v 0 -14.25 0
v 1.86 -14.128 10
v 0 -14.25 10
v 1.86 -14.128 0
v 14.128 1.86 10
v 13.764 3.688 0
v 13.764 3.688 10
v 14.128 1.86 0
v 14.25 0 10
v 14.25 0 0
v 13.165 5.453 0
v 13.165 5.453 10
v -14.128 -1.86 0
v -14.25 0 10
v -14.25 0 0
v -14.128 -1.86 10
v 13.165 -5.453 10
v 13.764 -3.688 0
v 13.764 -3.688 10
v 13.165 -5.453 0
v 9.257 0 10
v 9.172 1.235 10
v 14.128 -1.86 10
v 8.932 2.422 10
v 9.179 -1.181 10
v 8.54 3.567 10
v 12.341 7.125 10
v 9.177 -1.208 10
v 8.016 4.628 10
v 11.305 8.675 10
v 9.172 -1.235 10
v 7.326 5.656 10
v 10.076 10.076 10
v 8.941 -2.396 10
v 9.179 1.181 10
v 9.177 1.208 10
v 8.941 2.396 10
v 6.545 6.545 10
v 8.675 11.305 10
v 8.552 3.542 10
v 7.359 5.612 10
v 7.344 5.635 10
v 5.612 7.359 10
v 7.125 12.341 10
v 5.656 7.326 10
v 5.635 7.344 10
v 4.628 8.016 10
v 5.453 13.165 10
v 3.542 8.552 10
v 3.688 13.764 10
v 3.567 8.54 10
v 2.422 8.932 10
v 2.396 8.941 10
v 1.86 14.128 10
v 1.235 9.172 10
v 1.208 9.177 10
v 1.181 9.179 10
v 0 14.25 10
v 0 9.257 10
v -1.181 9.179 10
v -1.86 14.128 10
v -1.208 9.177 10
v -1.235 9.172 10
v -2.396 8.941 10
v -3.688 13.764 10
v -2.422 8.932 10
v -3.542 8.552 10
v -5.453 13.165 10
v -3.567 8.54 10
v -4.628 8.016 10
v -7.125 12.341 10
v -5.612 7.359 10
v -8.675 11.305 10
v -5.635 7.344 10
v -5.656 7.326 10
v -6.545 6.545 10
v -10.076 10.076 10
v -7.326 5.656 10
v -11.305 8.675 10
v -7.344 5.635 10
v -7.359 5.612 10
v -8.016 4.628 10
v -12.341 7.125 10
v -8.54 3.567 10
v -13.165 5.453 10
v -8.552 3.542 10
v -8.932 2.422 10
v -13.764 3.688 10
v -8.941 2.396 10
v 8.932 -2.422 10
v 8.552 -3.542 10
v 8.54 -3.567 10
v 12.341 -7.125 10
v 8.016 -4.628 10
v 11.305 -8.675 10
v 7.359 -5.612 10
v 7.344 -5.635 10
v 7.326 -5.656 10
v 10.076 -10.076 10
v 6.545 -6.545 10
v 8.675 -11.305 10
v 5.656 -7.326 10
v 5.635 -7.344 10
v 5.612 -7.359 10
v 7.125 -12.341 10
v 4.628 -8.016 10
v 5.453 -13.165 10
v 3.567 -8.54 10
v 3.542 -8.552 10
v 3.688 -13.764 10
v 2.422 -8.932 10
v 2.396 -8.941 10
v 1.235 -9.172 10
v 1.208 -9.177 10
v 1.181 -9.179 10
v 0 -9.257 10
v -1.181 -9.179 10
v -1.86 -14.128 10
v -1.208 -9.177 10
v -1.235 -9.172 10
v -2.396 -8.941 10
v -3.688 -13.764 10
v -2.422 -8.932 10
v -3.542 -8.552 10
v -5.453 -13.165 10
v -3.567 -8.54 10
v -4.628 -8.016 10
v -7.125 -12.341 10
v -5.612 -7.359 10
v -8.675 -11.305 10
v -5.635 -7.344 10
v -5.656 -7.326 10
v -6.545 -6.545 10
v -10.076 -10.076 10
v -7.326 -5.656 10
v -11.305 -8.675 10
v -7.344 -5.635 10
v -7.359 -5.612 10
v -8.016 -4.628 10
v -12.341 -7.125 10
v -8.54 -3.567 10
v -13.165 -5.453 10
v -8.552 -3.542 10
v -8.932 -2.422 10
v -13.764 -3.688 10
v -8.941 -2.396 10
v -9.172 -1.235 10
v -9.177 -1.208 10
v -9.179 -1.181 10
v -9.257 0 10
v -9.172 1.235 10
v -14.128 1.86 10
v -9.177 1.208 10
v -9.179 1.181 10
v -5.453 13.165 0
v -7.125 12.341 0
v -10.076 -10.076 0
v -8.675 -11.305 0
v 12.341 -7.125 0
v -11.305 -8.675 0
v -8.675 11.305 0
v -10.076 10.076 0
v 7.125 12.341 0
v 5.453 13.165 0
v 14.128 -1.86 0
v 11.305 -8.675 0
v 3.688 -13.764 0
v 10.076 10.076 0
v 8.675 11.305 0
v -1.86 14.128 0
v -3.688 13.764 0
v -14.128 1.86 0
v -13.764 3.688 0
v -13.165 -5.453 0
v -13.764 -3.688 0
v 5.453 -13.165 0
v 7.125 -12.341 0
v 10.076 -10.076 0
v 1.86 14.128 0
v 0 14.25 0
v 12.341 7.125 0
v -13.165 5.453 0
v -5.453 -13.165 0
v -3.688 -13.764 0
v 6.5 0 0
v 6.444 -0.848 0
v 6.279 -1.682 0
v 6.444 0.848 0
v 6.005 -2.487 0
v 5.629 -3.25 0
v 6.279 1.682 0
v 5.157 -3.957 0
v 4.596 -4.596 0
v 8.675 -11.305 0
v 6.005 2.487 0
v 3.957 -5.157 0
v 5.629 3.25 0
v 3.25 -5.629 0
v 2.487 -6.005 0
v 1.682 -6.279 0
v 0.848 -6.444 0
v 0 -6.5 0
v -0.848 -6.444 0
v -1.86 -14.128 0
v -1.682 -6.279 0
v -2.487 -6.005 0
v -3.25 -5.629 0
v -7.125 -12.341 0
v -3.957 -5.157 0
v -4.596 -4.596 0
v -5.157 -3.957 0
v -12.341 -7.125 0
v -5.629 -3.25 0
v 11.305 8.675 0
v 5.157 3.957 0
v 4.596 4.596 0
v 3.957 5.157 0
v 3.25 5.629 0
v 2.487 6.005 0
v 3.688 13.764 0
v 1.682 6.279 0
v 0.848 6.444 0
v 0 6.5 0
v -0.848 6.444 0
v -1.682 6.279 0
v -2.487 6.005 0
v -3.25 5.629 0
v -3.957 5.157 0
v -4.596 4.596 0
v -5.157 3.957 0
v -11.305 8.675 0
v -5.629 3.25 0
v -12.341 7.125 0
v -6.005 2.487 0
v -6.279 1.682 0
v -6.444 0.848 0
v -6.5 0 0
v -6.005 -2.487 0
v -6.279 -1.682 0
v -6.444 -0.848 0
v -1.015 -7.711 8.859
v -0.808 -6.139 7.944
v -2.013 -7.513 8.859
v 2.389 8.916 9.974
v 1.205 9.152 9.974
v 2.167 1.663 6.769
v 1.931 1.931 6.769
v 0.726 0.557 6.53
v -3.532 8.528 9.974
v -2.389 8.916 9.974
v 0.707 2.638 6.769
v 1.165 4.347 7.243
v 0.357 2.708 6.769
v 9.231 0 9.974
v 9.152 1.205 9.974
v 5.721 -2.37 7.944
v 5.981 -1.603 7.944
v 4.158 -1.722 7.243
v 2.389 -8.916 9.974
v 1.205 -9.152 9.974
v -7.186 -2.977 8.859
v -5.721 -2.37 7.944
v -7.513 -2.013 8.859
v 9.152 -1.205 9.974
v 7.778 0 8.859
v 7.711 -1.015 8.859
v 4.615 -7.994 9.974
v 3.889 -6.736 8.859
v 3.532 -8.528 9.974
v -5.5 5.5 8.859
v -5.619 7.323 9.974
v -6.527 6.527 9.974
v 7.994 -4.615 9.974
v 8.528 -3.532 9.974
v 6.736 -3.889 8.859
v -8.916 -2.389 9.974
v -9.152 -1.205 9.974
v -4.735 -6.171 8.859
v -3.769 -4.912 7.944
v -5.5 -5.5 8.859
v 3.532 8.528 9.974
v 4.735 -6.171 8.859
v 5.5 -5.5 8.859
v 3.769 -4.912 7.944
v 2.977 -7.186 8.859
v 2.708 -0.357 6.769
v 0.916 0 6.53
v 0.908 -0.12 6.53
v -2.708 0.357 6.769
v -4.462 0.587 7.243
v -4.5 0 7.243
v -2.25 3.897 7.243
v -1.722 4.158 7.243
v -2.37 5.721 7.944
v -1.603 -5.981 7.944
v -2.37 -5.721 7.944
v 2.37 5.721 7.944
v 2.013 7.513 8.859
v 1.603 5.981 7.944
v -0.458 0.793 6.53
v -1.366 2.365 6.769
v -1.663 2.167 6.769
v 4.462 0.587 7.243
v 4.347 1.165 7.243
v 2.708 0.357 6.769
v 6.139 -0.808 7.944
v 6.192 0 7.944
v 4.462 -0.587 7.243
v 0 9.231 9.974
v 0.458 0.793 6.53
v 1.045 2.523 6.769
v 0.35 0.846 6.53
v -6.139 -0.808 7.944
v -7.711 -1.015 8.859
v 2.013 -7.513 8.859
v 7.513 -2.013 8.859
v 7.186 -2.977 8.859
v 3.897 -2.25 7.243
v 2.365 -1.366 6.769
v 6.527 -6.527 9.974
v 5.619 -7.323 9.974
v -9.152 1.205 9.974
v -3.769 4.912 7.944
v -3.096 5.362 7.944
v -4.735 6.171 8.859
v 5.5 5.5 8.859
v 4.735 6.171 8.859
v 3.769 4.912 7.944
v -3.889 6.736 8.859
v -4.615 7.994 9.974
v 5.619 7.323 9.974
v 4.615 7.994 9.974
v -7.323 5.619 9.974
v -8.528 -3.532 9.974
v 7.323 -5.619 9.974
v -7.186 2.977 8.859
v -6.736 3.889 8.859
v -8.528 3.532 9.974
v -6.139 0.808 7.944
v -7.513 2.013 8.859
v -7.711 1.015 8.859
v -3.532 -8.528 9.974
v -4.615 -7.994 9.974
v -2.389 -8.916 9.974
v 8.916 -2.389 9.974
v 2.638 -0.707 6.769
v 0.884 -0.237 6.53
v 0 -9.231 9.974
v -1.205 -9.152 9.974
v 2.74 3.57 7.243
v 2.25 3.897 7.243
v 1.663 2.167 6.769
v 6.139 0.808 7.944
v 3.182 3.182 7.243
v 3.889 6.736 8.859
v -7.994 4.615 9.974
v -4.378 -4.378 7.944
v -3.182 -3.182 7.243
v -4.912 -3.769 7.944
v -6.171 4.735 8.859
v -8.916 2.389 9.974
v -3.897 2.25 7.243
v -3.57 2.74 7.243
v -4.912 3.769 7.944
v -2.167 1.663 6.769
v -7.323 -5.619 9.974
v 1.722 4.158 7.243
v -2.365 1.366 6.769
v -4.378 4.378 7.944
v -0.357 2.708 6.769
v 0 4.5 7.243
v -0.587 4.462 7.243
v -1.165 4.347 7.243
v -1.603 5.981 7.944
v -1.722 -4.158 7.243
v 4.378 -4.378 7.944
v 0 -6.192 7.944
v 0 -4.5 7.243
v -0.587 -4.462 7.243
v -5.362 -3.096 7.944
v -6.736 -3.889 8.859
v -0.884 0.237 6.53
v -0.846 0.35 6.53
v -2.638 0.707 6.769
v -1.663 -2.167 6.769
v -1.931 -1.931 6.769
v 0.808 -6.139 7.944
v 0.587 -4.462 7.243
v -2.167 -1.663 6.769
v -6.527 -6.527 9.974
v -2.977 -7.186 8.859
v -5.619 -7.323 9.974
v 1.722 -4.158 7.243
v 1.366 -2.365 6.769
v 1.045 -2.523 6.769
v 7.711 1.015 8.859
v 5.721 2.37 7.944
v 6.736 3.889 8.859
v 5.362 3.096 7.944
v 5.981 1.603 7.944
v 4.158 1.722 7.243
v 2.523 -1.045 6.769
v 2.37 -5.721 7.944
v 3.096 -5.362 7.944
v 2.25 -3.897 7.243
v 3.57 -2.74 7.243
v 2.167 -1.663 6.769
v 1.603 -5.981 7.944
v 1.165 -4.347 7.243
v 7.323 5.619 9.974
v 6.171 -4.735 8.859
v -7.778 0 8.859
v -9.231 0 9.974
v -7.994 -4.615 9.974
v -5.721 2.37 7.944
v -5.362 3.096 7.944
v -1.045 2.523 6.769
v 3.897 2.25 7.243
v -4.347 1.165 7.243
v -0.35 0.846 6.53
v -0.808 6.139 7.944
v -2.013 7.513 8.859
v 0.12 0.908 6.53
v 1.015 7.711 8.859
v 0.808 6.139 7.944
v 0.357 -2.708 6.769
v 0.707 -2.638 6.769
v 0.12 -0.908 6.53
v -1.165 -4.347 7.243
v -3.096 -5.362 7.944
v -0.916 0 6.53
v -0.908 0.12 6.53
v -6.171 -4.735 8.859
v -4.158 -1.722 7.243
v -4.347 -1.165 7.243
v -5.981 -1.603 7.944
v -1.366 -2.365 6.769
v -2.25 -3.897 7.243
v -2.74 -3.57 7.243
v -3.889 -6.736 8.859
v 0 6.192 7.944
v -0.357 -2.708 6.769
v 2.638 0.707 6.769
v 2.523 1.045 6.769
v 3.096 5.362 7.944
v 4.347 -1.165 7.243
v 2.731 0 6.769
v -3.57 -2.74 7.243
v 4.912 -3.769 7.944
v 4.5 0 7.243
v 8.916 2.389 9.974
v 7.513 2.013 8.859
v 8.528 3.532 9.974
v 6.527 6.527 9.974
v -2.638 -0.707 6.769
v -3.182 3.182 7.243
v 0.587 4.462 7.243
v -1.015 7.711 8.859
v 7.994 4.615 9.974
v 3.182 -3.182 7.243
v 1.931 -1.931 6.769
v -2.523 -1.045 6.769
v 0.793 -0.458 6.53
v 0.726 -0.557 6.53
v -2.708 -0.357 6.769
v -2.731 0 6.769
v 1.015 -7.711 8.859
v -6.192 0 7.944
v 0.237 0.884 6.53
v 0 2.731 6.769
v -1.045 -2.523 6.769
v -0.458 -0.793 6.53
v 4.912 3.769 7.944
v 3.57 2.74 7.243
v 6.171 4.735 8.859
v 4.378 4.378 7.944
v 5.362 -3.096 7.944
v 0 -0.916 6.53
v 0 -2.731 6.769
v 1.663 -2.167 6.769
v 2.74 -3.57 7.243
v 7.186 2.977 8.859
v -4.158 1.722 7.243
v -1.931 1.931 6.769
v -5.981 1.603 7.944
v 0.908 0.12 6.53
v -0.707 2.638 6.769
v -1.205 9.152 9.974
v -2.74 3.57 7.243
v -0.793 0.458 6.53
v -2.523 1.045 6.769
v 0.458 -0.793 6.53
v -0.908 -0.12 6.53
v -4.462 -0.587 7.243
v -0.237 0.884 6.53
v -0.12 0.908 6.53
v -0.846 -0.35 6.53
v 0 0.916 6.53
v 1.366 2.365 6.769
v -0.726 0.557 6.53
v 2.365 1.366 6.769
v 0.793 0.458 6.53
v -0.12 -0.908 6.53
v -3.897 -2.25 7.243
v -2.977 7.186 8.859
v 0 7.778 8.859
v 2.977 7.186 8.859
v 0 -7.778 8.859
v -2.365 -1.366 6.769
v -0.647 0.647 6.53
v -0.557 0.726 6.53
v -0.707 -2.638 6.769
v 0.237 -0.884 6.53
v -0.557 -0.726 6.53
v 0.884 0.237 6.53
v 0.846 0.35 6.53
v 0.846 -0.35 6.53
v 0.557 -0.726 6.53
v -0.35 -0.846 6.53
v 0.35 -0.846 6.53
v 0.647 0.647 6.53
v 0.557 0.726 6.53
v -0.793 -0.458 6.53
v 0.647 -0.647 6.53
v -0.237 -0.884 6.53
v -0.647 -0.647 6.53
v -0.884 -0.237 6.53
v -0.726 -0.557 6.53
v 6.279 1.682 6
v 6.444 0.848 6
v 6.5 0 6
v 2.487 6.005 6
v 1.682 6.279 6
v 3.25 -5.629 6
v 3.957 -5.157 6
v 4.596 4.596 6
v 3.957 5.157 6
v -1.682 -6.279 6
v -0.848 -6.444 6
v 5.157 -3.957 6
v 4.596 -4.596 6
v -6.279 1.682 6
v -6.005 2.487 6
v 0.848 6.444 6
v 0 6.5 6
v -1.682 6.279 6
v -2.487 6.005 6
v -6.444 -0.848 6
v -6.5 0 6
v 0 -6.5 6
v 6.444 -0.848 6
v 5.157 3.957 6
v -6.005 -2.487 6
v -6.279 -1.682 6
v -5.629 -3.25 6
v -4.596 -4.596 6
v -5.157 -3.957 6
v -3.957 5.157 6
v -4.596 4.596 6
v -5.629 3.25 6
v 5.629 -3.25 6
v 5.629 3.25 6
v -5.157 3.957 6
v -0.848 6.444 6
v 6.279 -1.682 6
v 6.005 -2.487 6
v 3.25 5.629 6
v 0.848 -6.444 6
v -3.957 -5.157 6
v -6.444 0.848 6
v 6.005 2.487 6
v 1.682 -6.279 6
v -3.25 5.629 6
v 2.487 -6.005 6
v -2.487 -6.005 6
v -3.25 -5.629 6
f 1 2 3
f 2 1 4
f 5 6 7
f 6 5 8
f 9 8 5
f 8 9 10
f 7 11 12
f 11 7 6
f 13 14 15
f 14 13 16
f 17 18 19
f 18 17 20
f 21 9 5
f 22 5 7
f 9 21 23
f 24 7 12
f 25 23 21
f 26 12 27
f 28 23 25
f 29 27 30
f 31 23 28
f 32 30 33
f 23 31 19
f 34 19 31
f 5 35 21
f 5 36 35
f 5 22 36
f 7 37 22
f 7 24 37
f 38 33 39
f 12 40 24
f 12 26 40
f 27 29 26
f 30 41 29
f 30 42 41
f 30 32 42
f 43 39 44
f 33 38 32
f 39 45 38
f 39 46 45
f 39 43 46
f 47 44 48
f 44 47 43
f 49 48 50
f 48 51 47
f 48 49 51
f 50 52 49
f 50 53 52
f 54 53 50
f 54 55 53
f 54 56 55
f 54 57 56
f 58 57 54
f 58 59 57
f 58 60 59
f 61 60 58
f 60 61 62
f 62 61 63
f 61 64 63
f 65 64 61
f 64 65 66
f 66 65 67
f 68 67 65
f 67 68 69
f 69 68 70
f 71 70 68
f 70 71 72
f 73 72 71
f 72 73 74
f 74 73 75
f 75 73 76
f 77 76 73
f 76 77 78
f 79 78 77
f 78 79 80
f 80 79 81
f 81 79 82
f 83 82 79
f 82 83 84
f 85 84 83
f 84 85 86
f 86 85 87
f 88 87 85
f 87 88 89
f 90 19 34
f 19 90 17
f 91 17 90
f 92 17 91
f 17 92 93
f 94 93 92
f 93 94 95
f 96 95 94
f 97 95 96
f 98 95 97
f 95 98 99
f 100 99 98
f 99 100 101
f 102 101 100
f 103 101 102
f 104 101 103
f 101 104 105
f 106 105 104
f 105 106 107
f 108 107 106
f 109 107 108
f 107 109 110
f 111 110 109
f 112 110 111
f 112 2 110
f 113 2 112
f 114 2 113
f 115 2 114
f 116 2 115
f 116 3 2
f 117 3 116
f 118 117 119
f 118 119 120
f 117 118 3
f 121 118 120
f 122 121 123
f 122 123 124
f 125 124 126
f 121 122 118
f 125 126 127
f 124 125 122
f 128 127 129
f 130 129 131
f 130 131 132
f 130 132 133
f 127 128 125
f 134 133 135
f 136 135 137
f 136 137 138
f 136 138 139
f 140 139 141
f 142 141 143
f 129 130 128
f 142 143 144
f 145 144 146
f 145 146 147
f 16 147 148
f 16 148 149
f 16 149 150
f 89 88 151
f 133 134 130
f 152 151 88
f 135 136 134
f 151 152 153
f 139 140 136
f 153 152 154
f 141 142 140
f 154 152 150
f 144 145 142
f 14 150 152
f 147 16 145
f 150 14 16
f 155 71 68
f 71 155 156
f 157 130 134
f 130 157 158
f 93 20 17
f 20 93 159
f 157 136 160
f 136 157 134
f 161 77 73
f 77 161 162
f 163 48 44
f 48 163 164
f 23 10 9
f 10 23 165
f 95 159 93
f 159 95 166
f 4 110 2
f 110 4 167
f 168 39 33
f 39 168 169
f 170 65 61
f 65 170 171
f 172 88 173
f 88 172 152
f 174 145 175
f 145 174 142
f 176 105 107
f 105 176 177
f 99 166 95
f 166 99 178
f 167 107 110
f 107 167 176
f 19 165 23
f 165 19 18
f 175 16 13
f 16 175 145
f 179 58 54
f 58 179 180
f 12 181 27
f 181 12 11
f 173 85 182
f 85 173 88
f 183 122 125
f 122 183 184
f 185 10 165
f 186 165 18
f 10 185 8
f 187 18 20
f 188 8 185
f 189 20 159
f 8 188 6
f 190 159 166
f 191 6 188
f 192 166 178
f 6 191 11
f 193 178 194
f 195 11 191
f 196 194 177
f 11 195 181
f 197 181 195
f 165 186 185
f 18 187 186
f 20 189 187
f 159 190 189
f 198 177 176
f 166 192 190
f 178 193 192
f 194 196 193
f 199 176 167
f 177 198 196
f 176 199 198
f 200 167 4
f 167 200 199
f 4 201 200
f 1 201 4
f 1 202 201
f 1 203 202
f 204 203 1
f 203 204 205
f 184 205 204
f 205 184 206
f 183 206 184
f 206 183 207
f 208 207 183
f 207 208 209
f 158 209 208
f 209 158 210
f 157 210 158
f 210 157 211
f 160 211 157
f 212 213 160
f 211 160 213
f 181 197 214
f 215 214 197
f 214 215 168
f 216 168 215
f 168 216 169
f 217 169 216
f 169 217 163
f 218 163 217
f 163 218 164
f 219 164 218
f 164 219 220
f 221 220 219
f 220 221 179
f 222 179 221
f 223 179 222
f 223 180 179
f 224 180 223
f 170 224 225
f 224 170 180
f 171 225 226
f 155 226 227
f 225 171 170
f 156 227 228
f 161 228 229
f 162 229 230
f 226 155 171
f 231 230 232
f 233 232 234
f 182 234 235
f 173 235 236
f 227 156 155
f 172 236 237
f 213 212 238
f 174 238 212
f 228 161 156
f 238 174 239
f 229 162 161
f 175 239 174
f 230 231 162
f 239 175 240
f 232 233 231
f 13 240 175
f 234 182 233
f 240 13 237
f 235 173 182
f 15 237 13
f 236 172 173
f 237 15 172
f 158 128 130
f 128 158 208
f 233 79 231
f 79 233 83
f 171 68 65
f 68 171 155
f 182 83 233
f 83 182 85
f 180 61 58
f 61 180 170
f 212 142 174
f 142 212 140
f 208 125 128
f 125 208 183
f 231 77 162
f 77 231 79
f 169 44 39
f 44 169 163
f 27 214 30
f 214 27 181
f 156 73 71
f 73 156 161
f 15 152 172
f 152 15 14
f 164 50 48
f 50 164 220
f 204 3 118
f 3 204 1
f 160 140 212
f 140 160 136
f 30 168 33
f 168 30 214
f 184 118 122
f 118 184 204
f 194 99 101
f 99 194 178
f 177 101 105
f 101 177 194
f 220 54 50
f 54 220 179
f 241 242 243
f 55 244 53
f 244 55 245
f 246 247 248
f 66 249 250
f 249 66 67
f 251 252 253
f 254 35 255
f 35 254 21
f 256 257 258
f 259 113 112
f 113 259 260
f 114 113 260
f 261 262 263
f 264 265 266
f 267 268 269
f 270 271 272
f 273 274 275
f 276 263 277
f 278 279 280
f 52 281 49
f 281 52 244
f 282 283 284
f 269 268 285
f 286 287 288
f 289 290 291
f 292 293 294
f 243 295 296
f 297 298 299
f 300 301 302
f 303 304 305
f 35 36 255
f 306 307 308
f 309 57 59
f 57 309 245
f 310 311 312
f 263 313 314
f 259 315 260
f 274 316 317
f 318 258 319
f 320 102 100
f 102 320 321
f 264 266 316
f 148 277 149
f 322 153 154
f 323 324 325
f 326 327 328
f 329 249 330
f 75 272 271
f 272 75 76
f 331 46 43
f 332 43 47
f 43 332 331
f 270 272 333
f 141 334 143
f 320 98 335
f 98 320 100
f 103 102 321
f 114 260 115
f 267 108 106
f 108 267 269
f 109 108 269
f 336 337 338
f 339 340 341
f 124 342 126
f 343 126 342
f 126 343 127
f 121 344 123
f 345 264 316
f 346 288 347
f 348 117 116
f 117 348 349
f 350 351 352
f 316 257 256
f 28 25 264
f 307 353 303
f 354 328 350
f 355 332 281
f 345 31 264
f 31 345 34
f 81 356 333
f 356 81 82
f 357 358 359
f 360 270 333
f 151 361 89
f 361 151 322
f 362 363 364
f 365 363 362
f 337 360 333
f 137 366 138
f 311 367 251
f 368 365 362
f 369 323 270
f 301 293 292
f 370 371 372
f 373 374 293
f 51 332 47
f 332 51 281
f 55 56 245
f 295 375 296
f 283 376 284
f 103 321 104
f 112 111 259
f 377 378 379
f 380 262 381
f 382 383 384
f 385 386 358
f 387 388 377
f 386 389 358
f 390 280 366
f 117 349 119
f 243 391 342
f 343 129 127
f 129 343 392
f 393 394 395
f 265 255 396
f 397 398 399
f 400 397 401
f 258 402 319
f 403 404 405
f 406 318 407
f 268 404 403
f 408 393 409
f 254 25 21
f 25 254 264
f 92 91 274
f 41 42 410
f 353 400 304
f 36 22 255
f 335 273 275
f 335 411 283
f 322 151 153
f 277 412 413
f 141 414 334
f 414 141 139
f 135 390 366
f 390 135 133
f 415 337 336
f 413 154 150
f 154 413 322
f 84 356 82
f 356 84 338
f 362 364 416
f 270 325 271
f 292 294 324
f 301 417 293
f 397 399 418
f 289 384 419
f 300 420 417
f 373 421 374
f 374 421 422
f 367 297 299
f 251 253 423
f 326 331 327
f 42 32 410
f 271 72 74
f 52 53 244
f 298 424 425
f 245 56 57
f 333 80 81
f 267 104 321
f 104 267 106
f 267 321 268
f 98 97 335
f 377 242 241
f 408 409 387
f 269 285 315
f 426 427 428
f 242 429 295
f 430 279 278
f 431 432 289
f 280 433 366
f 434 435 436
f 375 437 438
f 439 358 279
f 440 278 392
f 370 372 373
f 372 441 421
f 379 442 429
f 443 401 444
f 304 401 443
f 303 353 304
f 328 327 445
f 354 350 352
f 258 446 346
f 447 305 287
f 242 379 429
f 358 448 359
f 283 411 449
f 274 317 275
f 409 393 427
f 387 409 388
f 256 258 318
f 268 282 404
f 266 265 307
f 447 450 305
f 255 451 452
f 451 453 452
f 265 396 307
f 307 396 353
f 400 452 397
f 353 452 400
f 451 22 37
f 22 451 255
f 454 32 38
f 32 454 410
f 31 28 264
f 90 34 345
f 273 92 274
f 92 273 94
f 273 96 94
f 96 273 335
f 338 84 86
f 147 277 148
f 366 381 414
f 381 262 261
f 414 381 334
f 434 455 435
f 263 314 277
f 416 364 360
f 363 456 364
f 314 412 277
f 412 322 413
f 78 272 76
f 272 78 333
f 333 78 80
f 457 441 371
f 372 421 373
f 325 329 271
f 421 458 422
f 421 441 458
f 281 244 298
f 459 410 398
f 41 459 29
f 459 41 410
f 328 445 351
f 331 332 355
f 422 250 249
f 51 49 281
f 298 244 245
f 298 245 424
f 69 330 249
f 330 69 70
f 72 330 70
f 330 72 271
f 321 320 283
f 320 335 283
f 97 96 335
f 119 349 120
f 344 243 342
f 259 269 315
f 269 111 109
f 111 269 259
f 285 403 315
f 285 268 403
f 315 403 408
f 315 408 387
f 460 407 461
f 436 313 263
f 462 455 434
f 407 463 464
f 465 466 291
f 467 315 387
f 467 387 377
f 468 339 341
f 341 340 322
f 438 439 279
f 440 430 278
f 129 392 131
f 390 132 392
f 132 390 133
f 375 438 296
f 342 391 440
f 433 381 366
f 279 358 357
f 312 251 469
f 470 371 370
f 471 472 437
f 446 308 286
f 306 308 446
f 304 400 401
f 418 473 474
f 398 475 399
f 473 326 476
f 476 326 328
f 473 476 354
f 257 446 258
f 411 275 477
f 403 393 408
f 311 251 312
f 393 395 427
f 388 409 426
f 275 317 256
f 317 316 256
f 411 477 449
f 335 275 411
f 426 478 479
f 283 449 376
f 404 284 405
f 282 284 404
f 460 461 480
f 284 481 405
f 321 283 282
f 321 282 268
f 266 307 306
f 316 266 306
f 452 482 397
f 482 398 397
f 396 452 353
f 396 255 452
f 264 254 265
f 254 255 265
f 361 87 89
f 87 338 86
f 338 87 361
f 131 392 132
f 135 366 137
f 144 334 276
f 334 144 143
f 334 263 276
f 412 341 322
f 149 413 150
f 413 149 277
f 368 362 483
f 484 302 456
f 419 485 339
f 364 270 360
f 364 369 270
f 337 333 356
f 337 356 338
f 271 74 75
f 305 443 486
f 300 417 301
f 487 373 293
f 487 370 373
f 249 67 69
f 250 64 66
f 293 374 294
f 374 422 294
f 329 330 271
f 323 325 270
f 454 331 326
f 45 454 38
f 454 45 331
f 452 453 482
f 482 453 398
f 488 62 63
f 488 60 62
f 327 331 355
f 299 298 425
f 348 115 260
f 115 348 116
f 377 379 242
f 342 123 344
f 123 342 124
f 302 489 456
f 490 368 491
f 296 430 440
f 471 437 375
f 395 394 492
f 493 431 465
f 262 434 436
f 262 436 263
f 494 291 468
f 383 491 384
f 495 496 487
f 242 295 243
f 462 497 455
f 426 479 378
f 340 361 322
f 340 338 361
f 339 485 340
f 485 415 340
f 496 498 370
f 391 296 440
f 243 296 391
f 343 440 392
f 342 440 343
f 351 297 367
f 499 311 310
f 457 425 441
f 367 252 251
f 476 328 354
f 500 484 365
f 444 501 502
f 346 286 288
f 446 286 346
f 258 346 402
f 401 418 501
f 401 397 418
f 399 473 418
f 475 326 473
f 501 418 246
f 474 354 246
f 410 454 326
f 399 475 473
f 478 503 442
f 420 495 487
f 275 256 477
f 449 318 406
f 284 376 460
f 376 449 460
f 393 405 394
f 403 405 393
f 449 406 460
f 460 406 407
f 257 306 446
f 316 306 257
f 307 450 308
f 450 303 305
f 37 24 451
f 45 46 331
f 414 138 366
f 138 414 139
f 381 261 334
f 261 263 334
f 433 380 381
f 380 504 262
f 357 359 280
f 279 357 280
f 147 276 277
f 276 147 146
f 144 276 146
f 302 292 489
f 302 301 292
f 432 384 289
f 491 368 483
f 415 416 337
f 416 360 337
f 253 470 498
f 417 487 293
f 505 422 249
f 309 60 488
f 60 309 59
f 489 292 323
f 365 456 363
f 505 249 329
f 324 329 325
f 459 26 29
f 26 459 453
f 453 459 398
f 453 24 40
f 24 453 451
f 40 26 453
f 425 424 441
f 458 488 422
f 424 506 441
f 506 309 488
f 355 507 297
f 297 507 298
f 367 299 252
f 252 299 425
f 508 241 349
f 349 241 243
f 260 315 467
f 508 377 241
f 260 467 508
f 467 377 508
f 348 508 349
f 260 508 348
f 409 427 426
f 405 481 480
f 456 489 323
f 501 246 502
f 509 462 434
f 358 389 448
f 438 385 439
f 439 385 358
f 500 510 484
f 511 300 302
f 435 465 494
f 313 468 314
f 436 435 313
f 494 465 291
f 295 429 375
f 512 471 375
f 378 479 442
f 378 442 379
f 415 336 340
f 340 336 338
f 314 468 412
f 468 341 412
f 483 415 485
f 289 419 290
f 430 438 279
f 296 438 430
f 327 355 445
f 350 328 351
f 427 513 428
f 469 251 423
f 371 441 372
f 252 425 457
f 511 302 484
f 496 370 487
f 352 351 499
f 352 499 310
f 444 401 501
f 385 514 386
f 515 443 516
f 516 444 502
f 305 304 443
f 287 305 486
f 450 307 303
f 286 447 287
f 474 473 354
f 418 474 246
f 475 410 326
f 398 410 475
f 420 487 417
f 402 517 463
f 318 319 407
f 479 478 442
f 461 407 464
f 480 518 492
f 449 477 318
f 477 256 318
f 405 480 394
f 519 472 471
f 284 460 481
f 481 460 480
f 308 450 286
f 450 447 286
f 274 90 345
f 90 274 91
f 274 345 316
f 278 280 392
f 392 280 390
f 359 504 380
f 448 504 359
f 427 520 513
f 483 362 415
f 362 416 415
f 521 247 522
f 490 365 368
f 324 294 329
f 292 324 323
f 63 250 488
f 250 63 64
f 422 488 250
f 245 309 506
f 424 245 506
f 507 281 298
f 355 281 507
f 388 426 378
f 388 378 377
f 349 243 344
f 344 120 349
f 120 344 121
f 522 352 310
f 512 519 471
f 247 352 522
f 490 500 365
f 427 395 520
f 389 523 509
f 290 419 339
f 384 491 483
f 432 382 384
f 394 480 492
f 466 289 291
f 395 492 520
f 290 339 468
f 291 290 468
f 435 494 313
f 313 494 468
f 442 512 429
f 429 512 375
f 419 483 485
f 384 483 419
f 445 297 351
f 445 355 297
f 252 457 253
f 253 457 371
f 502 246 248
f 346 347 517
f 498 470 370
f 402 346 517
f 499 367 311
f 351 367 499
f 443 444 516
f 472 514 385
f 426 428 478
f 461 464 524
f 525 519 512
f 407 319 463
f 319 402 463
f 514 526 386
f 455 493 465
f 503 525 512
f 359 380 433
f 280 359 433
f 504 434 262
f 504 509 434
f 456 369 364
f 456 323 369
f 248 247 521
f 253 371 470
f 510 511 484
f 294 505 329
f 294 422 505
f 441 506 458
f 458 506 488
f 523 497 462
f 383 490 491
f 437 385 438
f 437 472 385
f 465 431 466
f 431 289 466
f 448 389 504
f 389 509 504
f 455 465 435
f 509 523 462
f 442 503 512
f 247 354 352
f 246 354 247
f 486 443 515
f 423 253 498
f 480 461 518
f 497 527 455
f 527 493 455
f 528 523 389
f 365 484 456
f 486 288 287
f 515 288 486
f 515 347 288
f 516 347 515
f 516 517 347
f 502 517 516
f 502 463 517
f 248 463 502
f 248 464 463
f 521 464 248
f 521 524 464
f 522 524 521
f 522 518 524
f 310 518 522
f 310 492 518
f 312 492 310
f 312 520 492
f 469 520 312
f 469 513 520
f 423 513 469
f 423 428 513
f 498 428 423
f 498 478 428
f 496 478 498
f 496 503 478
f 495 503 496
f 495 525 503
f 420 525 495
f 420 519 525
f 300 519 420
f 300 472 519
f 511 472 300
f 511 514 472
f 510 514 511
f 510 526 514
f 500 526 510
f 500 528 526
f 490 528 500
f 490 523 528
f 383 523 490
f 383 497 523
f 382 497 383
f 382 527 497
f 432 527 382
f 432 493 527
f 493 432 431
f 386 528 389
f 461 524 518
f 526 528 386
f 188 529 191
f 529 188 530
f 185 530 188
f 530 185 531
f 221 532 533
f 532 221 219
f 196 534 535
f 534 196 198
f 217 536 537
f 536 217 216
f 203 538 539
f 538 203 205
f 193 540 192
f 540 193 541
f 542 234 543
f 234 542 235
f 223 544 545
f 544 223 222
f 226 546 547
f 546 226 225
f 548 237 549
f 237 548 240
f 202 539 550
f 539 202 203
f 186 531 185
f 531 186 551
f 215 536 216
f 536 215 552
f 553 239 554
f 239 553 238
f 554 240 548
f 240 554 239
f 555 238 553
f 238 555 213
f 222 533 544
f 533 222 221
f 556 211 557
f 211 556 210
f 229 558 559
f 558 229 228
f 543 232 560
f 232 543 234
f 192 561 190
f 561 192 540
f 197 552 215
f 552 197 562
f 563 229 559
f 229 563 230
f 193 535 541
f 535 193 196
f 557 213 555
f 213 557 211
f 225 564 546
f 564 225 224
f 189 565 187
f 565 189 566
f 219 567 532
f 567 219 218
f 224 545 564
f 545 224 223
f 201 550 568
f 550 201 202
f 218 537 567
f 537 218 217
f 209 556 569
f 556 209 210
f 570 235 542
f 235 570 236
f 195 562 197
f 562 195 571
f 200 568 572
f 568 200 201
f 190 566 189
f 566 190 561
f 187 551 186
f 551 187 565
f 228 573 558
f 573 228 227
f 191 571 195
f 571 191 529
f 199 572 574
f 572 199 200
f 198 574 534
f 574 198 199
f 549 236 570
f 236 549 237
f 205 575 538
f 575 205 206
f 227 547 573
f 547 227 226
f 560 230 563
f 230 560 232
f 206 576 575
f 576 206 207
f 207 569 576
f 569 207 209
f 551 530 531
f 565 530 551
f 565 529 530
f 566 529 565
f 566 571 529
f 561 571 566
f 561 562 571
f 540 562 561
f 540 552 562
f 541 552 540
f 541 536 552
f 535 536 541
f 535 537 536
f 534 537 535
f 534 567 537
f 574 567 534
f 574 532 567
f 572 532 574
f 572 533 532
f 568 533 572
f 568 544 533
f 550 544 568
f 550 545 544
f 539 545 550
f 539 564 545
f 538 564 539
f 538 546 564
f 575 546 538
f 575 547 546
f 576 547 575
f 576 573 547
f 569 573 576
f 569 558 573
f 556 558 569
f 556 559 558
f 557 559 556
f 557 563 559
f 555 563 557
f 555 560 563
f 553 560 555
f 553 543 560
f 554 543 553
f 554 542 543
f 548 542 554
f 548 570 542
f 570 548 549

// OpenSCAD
// file: measurements.scad
// Measurements of YOUR table, shared by every printed part, in millimetres.
//
// These are placeholders until the real table is measured with calipers. Edit
// the numbers here (nothing else in this file), save, then open a part and
// export it. See docs/3d-printing.md.
//
// Positions are measured on the underside of the playfield, from its
// BOTTOM-LEFT corner (the corner nearest the player's left hand): x to the
// right, y up the table. The placeholders come from the playfield map and are
// only rough.

// --- The playfield ----------------------------------------------------------

// Thickness of the playfield at the trapdoor holes.
playfield_thickness = 12.7;

// --- The trapdoors ----------------------------------------------------------
// "Width" runs across the table (left to right); "length" runs up the table.

// Width of each trapdoor hole.
hole_width = 44;

// Length of each trapdoor hole.
hole_length = 48;

// Distance between the centres of neighbouring holes.
trapdoor_spacing = 50;

// Position of the CENTRE trapdoor hole's centre.
trapdoor_x = 240;
trapdoor_y = 614;

// --- The outhole ------------------------------------------------------------

// Position of the outhole's centre, and its diameter.
outhole_x = 240;
outhole_y = 25;
outhole_diameter = 32;

// --- The ball lift ----------------------------------------------------------

// Position of the hole in the shooter lane that the ball is lifted up through,
// and its diameter.
lift_hole_x = 502;
lift_hole_y = 40;
lift_hole_diameter = 30;

// The ball-serve (ball lift) coil assembly: the diameter of its plunger, and
// the distance between its two mounting screws.
lift_plunger_diameter = 12.7;
lift_coil_screw_spacing = 40;

// --- Screws and pins ---------------------------------------------------------

// Wood screws into the underside of the playfield. They must be SHORTER than
// the playfield is thick, or they'll come out through the artwork. 3.5 mm x
// 9.5 mm (No. 6 x 3/8") suits a 12.7 mm playfield.
wood_screw_diameter = 3.5;

// Steel rod used as each flap's hinge pin.
hinge_pin_diameter = 2;

// --- Printing ---------------------------------------------------------------

// Gap left between parts that fit together, for a typical printer. Make it
// bigger if parts are too tight, smaller if they're loose.
fit_clearance = 0.4;

// The longest part your printer (or printing service) can print. Long runs are
// split into segments no longer than this.
max_print_length = 170;
// main file
// Ball-lift cup: one. It pushes onto the top of the ball-serve coil's plunger
// and cradles the waiting ball, so the coil kicks it straight up the tube.
//
// Print it as it is: flat end on the bed. No supports needed.

include <common.scad>

cup();

module cup() {
    height = 10;
    difference() {
        cylinder(d = lift_tube_inner - 1.5, h = height);
        // A seat for the ball.
        translate([0, 0, height + ball_diameter / 2 - 3]) sphere(d = ball_diameter + 1);
        // The plunger.
        translate([0, 0, -1]) cylinder(d = lift_plunger_diameter + 0.3, h = 7);
    }
}
